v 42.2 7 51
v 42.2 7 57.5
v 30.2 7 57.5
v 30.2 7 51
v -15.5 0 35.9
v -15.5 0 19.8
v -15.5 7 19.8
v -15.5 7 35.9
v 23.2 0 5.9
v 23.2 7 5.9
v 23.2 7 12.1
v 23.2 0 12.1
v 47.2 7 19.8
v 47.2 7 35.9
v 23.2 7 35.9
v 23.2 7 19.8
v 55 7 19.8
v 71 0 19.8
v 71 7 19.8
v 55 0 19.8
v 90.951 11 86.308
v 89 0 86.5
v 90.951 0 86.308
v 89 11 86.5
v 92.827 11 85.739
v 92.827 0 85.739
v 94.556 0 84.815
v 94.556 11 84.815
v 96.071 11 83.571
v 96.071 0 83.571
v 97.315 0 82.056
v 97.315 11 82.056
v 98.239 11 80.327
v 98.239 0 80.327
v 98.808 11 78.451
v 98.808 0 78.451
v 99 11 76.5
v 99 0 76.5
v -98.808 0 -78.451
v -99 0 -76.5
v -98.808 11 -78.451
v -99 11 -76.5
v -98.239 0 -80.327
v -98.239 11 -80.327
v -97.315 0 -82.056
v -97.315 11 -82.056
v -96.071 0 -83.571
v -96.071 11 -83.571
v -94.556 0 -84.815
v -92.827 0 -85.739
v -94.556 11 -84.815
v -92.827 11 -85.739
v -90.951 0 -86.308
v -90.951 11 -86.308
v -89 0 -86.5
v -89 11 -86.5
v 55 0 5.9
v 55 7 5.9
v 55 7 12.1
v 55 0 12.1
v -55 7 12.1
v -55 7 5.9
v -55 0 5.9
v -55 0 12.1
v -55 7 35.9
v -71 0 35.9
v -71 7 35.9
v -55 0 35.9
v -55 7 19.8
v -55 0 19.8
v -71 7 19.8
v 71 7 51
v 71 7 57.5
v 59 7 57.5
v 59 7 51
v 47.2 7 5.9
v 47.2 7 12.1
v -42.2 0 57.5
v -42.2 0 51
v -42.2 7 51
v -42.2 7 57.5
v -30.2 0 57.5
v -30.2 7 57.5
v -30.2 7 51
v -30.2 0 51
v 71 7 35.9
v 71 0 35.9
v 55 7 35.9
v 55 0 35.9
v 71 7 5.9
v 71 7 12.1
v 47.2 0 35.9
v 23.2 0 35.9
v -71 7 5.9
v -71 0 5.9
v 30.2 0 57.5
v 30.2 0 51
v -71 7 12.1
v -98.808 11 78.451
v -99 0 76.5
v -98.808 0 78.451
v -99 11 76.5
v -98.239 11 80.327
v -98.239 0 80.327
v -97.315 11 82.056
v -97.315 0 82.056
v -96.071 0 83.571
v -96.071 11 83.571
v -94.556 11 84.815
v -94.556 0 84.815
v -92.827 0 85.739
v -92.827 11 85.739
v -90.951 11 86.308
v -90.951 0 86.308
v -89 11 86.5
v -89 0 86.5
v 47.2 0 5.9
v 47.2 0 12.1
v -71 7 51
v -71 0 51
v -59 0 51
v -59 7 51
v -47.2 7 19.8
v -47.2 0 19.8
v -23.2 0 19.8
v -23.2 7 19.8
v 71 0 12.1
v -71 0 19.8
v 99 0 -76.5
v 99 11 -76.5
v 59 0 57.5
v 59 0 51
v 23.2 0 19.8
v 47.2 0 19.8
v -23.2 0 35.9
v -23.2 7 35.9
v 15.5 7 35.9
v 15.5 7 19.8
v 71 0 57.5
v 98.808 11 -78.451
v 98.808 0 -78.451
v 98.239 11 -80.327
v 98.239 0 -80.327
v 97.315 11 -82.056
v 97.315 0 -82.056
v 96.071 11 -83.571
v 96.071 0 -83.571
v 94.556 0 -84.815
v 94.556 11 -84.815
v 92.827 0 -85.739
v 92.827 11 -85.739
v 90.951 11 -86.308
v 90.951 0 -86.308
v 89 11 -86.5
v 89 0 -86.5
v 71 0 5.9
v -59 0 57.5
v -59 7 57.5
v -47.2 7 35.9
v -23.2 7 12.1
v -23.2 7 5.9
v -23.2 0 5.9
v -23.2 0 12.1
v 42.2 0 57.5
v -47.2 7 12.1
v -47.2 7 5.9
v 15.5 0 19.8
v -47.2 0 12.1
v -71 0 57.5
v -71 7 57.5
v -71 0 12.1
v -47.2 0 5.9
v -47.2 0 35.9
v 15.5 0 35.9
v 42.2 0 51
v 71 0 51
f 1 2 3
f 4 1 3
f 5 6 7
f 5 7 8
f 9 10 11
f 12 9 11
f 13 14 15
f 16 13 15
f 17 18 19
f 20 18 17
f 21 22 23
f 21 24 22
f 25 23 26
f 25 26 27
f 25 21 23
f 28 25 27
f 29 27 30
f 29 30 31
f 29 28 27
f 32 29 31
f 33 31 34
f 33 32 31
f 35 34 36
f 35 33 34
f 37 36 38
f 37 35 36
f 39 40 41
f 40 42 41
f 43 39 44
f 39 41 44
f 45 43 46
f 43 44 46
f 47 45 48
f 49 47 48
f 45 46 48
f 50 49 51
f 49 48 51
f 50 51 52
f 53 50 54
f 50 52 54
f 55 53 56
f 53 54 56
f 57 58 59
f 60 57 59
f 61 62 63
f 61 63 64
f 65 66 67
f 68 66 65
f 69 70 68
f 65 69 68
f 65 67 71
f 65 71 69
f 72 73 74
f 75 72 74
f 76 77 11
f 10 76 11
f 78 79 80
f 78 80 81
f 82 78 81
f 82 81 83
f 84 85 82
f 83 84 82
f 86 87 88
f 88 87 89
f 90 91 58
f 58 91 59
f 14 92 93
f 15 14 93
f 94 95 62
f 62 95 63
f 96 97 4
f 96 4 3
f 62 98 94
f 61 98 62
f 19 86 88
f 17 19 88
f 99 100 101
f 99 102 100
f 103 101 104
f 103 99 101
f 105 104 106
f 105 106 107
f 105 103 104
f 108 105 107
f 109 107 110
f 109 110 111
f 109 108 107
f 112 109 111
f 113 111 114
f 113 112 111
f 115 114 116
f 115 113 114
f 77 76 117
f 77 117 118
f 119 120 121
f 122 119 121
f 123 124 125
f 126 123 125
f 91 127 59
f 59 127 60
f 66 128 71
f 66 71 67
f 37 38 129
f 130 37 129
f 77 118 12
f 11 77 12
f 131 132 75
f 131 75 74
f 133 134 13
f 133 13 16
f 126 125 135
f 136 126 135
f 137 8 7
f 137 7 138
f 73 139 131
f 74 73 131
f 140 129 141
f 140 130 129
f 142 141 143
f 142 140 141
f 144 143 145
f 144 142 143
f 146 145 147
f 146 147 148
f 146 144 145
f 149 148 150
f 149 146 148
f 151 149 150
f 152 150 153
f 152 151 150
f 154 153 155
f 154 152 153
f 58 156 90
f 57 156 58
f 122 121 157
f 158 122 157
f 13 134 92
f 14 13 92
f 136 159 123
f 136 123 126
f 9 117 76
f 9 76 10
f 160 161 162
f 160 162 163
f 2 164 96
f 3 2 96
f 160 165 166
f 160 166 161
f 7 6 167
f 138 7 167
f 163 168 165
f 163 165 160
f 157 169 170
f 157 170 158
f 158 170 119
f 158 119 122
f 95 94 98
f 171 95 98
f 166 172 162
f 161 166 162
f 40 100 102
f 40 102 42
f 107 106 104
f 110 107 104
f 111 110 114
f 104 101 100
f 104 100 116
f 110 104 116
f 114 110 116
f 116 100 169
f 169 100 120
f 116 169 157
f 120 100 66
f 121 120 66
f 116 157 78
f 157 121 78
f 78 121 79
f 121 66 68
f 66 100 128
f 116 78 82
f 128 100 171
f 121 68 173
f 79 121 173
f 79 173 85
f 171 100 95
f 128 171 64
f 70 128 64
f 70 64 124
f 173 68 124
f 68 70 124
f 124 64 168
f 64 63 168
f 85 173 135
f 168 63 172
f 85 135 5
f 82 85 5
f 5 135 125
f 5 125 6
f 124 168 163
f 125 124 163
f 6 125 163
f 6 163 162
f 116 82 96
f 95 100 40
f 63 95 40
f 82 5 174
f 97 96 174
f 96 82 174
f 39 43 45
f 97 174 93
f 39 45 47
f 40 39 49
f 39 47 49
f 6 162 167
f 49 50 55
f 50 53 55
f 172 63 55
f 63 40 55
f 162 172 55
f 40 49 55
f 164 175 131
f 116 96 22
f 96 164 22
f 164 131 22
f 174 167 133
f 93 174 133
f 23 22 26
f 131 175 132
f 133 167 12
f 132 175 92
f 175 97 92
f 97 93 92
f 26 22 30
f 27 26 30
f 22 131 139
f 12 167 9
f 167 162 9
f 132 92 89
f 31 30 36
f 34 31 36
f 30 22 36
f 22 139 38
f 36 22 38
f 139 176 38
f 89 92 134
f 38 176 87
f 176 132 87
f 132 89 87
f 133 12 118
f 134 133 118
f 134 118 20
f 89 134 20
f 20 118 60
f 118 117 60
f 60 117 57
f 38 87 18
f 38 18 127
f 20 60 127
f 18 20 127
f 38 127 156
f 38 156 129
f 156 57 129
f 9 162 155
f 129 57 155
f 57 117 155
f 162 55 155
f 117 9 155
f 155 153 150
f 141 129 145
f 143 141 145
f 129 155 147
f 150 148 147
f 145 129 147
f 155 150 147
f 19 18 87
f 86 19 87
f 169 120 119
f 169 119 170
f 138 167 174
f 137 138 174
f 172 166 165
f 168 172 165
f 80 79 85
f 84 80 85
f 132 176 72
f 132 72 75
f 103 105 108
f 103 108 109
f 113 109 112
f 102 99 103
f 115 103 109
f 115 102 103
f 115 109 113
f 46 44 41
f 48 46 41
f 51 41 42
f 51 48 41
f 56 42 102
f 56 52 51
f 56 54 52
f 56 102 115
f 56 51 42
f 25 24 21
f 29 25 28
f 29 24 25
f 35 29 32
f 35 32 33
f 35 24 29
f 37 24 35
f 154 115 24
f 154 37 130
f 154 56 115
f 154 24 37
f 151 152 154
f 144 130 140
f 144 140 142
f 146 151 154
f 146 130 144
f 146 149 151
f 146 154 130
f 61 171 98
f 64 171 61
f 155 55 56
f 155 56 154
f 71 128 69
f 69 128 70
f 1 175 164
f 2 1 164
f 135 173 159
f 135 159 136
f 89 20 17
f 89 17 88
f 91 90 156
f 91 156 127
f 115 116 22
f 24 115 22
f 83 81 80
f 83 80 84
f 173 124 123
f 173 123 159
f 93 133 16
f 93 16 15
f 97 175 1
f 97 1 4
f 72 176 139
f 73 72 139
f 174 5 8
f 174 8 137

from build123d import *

# Parameters (mm, degrees)
SKETCH1_W           = 198
SKETCH1_H           = 173
BOSS_EXTRUDE1_DEPTH = 11
FILLET1_R           = 10
SKETCH2_W           = 12
SKETCH2_H           = 6.5
SKETCH2_W_2         = 16
SKETCH2_H_2         = 16.1
SKETCH2_H_3         = 6.2
SKETCH2_W_3         = 24
SKETCH2_W_4         = 31
CUT_EXTRUDE1_DEPTH  = 7


with BuildPart() as part:
    # Sketch1 → Boss-Extrude1 (new body)
    with BuildSketch(Plane(origin=(0, 0, 0), x_dir=(1, 0, 0), z_dir=(0, 1, 0))):
        Rectangle(SKETCH1_W, SKETCH1_H)
    extrude(amount=BOSS_EXTRUDE1_DEPTH)

    # Fillet1
    fillet1_edges = [part.edges().sort_by_distance(p)[0] for p in [
        (-99, 5.5, -86.5),
        (99, 5.5, -86.5),
        (99, 5.5, 86.5),
        (-99, 5.5, 86.5),
    ]]
    fillet(fillet1_edges, radius=FILLET1_R)

    # Sketch2 → Cut-Extrude1 (cut)
    with BuildSketch(Plane.XZ):
        with Locations((-65, 54.25)):
            Rectangle(SKETCH2_W, SKETCH2_H)
        with Locations((-36.2, 54.25)):
            Rectangle(SKETCH2_W, SKETCH2_H)
        with Locations((-63, 27.85)):
            Rectangle(SKETCH2_W_2, SKETCH2_H_2)
        with Locations((-63, 9)):
            Rectangle(SKETCH2_W_2, SKETCH2_H_3)
        with Locations((-35.2, 27.85)):
            Rectangle(SKETCH2_W_3, SKETCH2_H_2)
        with Locations((-35.2, 9)):
            Rectangle(SKETCH2_W_3, SKETCH2_H_3)
        with Locations((0, 27.85)):
            Rectangle(SKETCH2_W_4, SKETCH2_H_2)
    cut_extrude1 = extrude(amount=-CUT_EXTRUDE1_DEPTH, mode=Mode.SUBTRACT)

    # Mirror1: Cut-Extrude1 across plane
    add(cut_extrude1.mirror(Plane.ZY), mode=Mode.SUBTRACT)


solid = part.part
